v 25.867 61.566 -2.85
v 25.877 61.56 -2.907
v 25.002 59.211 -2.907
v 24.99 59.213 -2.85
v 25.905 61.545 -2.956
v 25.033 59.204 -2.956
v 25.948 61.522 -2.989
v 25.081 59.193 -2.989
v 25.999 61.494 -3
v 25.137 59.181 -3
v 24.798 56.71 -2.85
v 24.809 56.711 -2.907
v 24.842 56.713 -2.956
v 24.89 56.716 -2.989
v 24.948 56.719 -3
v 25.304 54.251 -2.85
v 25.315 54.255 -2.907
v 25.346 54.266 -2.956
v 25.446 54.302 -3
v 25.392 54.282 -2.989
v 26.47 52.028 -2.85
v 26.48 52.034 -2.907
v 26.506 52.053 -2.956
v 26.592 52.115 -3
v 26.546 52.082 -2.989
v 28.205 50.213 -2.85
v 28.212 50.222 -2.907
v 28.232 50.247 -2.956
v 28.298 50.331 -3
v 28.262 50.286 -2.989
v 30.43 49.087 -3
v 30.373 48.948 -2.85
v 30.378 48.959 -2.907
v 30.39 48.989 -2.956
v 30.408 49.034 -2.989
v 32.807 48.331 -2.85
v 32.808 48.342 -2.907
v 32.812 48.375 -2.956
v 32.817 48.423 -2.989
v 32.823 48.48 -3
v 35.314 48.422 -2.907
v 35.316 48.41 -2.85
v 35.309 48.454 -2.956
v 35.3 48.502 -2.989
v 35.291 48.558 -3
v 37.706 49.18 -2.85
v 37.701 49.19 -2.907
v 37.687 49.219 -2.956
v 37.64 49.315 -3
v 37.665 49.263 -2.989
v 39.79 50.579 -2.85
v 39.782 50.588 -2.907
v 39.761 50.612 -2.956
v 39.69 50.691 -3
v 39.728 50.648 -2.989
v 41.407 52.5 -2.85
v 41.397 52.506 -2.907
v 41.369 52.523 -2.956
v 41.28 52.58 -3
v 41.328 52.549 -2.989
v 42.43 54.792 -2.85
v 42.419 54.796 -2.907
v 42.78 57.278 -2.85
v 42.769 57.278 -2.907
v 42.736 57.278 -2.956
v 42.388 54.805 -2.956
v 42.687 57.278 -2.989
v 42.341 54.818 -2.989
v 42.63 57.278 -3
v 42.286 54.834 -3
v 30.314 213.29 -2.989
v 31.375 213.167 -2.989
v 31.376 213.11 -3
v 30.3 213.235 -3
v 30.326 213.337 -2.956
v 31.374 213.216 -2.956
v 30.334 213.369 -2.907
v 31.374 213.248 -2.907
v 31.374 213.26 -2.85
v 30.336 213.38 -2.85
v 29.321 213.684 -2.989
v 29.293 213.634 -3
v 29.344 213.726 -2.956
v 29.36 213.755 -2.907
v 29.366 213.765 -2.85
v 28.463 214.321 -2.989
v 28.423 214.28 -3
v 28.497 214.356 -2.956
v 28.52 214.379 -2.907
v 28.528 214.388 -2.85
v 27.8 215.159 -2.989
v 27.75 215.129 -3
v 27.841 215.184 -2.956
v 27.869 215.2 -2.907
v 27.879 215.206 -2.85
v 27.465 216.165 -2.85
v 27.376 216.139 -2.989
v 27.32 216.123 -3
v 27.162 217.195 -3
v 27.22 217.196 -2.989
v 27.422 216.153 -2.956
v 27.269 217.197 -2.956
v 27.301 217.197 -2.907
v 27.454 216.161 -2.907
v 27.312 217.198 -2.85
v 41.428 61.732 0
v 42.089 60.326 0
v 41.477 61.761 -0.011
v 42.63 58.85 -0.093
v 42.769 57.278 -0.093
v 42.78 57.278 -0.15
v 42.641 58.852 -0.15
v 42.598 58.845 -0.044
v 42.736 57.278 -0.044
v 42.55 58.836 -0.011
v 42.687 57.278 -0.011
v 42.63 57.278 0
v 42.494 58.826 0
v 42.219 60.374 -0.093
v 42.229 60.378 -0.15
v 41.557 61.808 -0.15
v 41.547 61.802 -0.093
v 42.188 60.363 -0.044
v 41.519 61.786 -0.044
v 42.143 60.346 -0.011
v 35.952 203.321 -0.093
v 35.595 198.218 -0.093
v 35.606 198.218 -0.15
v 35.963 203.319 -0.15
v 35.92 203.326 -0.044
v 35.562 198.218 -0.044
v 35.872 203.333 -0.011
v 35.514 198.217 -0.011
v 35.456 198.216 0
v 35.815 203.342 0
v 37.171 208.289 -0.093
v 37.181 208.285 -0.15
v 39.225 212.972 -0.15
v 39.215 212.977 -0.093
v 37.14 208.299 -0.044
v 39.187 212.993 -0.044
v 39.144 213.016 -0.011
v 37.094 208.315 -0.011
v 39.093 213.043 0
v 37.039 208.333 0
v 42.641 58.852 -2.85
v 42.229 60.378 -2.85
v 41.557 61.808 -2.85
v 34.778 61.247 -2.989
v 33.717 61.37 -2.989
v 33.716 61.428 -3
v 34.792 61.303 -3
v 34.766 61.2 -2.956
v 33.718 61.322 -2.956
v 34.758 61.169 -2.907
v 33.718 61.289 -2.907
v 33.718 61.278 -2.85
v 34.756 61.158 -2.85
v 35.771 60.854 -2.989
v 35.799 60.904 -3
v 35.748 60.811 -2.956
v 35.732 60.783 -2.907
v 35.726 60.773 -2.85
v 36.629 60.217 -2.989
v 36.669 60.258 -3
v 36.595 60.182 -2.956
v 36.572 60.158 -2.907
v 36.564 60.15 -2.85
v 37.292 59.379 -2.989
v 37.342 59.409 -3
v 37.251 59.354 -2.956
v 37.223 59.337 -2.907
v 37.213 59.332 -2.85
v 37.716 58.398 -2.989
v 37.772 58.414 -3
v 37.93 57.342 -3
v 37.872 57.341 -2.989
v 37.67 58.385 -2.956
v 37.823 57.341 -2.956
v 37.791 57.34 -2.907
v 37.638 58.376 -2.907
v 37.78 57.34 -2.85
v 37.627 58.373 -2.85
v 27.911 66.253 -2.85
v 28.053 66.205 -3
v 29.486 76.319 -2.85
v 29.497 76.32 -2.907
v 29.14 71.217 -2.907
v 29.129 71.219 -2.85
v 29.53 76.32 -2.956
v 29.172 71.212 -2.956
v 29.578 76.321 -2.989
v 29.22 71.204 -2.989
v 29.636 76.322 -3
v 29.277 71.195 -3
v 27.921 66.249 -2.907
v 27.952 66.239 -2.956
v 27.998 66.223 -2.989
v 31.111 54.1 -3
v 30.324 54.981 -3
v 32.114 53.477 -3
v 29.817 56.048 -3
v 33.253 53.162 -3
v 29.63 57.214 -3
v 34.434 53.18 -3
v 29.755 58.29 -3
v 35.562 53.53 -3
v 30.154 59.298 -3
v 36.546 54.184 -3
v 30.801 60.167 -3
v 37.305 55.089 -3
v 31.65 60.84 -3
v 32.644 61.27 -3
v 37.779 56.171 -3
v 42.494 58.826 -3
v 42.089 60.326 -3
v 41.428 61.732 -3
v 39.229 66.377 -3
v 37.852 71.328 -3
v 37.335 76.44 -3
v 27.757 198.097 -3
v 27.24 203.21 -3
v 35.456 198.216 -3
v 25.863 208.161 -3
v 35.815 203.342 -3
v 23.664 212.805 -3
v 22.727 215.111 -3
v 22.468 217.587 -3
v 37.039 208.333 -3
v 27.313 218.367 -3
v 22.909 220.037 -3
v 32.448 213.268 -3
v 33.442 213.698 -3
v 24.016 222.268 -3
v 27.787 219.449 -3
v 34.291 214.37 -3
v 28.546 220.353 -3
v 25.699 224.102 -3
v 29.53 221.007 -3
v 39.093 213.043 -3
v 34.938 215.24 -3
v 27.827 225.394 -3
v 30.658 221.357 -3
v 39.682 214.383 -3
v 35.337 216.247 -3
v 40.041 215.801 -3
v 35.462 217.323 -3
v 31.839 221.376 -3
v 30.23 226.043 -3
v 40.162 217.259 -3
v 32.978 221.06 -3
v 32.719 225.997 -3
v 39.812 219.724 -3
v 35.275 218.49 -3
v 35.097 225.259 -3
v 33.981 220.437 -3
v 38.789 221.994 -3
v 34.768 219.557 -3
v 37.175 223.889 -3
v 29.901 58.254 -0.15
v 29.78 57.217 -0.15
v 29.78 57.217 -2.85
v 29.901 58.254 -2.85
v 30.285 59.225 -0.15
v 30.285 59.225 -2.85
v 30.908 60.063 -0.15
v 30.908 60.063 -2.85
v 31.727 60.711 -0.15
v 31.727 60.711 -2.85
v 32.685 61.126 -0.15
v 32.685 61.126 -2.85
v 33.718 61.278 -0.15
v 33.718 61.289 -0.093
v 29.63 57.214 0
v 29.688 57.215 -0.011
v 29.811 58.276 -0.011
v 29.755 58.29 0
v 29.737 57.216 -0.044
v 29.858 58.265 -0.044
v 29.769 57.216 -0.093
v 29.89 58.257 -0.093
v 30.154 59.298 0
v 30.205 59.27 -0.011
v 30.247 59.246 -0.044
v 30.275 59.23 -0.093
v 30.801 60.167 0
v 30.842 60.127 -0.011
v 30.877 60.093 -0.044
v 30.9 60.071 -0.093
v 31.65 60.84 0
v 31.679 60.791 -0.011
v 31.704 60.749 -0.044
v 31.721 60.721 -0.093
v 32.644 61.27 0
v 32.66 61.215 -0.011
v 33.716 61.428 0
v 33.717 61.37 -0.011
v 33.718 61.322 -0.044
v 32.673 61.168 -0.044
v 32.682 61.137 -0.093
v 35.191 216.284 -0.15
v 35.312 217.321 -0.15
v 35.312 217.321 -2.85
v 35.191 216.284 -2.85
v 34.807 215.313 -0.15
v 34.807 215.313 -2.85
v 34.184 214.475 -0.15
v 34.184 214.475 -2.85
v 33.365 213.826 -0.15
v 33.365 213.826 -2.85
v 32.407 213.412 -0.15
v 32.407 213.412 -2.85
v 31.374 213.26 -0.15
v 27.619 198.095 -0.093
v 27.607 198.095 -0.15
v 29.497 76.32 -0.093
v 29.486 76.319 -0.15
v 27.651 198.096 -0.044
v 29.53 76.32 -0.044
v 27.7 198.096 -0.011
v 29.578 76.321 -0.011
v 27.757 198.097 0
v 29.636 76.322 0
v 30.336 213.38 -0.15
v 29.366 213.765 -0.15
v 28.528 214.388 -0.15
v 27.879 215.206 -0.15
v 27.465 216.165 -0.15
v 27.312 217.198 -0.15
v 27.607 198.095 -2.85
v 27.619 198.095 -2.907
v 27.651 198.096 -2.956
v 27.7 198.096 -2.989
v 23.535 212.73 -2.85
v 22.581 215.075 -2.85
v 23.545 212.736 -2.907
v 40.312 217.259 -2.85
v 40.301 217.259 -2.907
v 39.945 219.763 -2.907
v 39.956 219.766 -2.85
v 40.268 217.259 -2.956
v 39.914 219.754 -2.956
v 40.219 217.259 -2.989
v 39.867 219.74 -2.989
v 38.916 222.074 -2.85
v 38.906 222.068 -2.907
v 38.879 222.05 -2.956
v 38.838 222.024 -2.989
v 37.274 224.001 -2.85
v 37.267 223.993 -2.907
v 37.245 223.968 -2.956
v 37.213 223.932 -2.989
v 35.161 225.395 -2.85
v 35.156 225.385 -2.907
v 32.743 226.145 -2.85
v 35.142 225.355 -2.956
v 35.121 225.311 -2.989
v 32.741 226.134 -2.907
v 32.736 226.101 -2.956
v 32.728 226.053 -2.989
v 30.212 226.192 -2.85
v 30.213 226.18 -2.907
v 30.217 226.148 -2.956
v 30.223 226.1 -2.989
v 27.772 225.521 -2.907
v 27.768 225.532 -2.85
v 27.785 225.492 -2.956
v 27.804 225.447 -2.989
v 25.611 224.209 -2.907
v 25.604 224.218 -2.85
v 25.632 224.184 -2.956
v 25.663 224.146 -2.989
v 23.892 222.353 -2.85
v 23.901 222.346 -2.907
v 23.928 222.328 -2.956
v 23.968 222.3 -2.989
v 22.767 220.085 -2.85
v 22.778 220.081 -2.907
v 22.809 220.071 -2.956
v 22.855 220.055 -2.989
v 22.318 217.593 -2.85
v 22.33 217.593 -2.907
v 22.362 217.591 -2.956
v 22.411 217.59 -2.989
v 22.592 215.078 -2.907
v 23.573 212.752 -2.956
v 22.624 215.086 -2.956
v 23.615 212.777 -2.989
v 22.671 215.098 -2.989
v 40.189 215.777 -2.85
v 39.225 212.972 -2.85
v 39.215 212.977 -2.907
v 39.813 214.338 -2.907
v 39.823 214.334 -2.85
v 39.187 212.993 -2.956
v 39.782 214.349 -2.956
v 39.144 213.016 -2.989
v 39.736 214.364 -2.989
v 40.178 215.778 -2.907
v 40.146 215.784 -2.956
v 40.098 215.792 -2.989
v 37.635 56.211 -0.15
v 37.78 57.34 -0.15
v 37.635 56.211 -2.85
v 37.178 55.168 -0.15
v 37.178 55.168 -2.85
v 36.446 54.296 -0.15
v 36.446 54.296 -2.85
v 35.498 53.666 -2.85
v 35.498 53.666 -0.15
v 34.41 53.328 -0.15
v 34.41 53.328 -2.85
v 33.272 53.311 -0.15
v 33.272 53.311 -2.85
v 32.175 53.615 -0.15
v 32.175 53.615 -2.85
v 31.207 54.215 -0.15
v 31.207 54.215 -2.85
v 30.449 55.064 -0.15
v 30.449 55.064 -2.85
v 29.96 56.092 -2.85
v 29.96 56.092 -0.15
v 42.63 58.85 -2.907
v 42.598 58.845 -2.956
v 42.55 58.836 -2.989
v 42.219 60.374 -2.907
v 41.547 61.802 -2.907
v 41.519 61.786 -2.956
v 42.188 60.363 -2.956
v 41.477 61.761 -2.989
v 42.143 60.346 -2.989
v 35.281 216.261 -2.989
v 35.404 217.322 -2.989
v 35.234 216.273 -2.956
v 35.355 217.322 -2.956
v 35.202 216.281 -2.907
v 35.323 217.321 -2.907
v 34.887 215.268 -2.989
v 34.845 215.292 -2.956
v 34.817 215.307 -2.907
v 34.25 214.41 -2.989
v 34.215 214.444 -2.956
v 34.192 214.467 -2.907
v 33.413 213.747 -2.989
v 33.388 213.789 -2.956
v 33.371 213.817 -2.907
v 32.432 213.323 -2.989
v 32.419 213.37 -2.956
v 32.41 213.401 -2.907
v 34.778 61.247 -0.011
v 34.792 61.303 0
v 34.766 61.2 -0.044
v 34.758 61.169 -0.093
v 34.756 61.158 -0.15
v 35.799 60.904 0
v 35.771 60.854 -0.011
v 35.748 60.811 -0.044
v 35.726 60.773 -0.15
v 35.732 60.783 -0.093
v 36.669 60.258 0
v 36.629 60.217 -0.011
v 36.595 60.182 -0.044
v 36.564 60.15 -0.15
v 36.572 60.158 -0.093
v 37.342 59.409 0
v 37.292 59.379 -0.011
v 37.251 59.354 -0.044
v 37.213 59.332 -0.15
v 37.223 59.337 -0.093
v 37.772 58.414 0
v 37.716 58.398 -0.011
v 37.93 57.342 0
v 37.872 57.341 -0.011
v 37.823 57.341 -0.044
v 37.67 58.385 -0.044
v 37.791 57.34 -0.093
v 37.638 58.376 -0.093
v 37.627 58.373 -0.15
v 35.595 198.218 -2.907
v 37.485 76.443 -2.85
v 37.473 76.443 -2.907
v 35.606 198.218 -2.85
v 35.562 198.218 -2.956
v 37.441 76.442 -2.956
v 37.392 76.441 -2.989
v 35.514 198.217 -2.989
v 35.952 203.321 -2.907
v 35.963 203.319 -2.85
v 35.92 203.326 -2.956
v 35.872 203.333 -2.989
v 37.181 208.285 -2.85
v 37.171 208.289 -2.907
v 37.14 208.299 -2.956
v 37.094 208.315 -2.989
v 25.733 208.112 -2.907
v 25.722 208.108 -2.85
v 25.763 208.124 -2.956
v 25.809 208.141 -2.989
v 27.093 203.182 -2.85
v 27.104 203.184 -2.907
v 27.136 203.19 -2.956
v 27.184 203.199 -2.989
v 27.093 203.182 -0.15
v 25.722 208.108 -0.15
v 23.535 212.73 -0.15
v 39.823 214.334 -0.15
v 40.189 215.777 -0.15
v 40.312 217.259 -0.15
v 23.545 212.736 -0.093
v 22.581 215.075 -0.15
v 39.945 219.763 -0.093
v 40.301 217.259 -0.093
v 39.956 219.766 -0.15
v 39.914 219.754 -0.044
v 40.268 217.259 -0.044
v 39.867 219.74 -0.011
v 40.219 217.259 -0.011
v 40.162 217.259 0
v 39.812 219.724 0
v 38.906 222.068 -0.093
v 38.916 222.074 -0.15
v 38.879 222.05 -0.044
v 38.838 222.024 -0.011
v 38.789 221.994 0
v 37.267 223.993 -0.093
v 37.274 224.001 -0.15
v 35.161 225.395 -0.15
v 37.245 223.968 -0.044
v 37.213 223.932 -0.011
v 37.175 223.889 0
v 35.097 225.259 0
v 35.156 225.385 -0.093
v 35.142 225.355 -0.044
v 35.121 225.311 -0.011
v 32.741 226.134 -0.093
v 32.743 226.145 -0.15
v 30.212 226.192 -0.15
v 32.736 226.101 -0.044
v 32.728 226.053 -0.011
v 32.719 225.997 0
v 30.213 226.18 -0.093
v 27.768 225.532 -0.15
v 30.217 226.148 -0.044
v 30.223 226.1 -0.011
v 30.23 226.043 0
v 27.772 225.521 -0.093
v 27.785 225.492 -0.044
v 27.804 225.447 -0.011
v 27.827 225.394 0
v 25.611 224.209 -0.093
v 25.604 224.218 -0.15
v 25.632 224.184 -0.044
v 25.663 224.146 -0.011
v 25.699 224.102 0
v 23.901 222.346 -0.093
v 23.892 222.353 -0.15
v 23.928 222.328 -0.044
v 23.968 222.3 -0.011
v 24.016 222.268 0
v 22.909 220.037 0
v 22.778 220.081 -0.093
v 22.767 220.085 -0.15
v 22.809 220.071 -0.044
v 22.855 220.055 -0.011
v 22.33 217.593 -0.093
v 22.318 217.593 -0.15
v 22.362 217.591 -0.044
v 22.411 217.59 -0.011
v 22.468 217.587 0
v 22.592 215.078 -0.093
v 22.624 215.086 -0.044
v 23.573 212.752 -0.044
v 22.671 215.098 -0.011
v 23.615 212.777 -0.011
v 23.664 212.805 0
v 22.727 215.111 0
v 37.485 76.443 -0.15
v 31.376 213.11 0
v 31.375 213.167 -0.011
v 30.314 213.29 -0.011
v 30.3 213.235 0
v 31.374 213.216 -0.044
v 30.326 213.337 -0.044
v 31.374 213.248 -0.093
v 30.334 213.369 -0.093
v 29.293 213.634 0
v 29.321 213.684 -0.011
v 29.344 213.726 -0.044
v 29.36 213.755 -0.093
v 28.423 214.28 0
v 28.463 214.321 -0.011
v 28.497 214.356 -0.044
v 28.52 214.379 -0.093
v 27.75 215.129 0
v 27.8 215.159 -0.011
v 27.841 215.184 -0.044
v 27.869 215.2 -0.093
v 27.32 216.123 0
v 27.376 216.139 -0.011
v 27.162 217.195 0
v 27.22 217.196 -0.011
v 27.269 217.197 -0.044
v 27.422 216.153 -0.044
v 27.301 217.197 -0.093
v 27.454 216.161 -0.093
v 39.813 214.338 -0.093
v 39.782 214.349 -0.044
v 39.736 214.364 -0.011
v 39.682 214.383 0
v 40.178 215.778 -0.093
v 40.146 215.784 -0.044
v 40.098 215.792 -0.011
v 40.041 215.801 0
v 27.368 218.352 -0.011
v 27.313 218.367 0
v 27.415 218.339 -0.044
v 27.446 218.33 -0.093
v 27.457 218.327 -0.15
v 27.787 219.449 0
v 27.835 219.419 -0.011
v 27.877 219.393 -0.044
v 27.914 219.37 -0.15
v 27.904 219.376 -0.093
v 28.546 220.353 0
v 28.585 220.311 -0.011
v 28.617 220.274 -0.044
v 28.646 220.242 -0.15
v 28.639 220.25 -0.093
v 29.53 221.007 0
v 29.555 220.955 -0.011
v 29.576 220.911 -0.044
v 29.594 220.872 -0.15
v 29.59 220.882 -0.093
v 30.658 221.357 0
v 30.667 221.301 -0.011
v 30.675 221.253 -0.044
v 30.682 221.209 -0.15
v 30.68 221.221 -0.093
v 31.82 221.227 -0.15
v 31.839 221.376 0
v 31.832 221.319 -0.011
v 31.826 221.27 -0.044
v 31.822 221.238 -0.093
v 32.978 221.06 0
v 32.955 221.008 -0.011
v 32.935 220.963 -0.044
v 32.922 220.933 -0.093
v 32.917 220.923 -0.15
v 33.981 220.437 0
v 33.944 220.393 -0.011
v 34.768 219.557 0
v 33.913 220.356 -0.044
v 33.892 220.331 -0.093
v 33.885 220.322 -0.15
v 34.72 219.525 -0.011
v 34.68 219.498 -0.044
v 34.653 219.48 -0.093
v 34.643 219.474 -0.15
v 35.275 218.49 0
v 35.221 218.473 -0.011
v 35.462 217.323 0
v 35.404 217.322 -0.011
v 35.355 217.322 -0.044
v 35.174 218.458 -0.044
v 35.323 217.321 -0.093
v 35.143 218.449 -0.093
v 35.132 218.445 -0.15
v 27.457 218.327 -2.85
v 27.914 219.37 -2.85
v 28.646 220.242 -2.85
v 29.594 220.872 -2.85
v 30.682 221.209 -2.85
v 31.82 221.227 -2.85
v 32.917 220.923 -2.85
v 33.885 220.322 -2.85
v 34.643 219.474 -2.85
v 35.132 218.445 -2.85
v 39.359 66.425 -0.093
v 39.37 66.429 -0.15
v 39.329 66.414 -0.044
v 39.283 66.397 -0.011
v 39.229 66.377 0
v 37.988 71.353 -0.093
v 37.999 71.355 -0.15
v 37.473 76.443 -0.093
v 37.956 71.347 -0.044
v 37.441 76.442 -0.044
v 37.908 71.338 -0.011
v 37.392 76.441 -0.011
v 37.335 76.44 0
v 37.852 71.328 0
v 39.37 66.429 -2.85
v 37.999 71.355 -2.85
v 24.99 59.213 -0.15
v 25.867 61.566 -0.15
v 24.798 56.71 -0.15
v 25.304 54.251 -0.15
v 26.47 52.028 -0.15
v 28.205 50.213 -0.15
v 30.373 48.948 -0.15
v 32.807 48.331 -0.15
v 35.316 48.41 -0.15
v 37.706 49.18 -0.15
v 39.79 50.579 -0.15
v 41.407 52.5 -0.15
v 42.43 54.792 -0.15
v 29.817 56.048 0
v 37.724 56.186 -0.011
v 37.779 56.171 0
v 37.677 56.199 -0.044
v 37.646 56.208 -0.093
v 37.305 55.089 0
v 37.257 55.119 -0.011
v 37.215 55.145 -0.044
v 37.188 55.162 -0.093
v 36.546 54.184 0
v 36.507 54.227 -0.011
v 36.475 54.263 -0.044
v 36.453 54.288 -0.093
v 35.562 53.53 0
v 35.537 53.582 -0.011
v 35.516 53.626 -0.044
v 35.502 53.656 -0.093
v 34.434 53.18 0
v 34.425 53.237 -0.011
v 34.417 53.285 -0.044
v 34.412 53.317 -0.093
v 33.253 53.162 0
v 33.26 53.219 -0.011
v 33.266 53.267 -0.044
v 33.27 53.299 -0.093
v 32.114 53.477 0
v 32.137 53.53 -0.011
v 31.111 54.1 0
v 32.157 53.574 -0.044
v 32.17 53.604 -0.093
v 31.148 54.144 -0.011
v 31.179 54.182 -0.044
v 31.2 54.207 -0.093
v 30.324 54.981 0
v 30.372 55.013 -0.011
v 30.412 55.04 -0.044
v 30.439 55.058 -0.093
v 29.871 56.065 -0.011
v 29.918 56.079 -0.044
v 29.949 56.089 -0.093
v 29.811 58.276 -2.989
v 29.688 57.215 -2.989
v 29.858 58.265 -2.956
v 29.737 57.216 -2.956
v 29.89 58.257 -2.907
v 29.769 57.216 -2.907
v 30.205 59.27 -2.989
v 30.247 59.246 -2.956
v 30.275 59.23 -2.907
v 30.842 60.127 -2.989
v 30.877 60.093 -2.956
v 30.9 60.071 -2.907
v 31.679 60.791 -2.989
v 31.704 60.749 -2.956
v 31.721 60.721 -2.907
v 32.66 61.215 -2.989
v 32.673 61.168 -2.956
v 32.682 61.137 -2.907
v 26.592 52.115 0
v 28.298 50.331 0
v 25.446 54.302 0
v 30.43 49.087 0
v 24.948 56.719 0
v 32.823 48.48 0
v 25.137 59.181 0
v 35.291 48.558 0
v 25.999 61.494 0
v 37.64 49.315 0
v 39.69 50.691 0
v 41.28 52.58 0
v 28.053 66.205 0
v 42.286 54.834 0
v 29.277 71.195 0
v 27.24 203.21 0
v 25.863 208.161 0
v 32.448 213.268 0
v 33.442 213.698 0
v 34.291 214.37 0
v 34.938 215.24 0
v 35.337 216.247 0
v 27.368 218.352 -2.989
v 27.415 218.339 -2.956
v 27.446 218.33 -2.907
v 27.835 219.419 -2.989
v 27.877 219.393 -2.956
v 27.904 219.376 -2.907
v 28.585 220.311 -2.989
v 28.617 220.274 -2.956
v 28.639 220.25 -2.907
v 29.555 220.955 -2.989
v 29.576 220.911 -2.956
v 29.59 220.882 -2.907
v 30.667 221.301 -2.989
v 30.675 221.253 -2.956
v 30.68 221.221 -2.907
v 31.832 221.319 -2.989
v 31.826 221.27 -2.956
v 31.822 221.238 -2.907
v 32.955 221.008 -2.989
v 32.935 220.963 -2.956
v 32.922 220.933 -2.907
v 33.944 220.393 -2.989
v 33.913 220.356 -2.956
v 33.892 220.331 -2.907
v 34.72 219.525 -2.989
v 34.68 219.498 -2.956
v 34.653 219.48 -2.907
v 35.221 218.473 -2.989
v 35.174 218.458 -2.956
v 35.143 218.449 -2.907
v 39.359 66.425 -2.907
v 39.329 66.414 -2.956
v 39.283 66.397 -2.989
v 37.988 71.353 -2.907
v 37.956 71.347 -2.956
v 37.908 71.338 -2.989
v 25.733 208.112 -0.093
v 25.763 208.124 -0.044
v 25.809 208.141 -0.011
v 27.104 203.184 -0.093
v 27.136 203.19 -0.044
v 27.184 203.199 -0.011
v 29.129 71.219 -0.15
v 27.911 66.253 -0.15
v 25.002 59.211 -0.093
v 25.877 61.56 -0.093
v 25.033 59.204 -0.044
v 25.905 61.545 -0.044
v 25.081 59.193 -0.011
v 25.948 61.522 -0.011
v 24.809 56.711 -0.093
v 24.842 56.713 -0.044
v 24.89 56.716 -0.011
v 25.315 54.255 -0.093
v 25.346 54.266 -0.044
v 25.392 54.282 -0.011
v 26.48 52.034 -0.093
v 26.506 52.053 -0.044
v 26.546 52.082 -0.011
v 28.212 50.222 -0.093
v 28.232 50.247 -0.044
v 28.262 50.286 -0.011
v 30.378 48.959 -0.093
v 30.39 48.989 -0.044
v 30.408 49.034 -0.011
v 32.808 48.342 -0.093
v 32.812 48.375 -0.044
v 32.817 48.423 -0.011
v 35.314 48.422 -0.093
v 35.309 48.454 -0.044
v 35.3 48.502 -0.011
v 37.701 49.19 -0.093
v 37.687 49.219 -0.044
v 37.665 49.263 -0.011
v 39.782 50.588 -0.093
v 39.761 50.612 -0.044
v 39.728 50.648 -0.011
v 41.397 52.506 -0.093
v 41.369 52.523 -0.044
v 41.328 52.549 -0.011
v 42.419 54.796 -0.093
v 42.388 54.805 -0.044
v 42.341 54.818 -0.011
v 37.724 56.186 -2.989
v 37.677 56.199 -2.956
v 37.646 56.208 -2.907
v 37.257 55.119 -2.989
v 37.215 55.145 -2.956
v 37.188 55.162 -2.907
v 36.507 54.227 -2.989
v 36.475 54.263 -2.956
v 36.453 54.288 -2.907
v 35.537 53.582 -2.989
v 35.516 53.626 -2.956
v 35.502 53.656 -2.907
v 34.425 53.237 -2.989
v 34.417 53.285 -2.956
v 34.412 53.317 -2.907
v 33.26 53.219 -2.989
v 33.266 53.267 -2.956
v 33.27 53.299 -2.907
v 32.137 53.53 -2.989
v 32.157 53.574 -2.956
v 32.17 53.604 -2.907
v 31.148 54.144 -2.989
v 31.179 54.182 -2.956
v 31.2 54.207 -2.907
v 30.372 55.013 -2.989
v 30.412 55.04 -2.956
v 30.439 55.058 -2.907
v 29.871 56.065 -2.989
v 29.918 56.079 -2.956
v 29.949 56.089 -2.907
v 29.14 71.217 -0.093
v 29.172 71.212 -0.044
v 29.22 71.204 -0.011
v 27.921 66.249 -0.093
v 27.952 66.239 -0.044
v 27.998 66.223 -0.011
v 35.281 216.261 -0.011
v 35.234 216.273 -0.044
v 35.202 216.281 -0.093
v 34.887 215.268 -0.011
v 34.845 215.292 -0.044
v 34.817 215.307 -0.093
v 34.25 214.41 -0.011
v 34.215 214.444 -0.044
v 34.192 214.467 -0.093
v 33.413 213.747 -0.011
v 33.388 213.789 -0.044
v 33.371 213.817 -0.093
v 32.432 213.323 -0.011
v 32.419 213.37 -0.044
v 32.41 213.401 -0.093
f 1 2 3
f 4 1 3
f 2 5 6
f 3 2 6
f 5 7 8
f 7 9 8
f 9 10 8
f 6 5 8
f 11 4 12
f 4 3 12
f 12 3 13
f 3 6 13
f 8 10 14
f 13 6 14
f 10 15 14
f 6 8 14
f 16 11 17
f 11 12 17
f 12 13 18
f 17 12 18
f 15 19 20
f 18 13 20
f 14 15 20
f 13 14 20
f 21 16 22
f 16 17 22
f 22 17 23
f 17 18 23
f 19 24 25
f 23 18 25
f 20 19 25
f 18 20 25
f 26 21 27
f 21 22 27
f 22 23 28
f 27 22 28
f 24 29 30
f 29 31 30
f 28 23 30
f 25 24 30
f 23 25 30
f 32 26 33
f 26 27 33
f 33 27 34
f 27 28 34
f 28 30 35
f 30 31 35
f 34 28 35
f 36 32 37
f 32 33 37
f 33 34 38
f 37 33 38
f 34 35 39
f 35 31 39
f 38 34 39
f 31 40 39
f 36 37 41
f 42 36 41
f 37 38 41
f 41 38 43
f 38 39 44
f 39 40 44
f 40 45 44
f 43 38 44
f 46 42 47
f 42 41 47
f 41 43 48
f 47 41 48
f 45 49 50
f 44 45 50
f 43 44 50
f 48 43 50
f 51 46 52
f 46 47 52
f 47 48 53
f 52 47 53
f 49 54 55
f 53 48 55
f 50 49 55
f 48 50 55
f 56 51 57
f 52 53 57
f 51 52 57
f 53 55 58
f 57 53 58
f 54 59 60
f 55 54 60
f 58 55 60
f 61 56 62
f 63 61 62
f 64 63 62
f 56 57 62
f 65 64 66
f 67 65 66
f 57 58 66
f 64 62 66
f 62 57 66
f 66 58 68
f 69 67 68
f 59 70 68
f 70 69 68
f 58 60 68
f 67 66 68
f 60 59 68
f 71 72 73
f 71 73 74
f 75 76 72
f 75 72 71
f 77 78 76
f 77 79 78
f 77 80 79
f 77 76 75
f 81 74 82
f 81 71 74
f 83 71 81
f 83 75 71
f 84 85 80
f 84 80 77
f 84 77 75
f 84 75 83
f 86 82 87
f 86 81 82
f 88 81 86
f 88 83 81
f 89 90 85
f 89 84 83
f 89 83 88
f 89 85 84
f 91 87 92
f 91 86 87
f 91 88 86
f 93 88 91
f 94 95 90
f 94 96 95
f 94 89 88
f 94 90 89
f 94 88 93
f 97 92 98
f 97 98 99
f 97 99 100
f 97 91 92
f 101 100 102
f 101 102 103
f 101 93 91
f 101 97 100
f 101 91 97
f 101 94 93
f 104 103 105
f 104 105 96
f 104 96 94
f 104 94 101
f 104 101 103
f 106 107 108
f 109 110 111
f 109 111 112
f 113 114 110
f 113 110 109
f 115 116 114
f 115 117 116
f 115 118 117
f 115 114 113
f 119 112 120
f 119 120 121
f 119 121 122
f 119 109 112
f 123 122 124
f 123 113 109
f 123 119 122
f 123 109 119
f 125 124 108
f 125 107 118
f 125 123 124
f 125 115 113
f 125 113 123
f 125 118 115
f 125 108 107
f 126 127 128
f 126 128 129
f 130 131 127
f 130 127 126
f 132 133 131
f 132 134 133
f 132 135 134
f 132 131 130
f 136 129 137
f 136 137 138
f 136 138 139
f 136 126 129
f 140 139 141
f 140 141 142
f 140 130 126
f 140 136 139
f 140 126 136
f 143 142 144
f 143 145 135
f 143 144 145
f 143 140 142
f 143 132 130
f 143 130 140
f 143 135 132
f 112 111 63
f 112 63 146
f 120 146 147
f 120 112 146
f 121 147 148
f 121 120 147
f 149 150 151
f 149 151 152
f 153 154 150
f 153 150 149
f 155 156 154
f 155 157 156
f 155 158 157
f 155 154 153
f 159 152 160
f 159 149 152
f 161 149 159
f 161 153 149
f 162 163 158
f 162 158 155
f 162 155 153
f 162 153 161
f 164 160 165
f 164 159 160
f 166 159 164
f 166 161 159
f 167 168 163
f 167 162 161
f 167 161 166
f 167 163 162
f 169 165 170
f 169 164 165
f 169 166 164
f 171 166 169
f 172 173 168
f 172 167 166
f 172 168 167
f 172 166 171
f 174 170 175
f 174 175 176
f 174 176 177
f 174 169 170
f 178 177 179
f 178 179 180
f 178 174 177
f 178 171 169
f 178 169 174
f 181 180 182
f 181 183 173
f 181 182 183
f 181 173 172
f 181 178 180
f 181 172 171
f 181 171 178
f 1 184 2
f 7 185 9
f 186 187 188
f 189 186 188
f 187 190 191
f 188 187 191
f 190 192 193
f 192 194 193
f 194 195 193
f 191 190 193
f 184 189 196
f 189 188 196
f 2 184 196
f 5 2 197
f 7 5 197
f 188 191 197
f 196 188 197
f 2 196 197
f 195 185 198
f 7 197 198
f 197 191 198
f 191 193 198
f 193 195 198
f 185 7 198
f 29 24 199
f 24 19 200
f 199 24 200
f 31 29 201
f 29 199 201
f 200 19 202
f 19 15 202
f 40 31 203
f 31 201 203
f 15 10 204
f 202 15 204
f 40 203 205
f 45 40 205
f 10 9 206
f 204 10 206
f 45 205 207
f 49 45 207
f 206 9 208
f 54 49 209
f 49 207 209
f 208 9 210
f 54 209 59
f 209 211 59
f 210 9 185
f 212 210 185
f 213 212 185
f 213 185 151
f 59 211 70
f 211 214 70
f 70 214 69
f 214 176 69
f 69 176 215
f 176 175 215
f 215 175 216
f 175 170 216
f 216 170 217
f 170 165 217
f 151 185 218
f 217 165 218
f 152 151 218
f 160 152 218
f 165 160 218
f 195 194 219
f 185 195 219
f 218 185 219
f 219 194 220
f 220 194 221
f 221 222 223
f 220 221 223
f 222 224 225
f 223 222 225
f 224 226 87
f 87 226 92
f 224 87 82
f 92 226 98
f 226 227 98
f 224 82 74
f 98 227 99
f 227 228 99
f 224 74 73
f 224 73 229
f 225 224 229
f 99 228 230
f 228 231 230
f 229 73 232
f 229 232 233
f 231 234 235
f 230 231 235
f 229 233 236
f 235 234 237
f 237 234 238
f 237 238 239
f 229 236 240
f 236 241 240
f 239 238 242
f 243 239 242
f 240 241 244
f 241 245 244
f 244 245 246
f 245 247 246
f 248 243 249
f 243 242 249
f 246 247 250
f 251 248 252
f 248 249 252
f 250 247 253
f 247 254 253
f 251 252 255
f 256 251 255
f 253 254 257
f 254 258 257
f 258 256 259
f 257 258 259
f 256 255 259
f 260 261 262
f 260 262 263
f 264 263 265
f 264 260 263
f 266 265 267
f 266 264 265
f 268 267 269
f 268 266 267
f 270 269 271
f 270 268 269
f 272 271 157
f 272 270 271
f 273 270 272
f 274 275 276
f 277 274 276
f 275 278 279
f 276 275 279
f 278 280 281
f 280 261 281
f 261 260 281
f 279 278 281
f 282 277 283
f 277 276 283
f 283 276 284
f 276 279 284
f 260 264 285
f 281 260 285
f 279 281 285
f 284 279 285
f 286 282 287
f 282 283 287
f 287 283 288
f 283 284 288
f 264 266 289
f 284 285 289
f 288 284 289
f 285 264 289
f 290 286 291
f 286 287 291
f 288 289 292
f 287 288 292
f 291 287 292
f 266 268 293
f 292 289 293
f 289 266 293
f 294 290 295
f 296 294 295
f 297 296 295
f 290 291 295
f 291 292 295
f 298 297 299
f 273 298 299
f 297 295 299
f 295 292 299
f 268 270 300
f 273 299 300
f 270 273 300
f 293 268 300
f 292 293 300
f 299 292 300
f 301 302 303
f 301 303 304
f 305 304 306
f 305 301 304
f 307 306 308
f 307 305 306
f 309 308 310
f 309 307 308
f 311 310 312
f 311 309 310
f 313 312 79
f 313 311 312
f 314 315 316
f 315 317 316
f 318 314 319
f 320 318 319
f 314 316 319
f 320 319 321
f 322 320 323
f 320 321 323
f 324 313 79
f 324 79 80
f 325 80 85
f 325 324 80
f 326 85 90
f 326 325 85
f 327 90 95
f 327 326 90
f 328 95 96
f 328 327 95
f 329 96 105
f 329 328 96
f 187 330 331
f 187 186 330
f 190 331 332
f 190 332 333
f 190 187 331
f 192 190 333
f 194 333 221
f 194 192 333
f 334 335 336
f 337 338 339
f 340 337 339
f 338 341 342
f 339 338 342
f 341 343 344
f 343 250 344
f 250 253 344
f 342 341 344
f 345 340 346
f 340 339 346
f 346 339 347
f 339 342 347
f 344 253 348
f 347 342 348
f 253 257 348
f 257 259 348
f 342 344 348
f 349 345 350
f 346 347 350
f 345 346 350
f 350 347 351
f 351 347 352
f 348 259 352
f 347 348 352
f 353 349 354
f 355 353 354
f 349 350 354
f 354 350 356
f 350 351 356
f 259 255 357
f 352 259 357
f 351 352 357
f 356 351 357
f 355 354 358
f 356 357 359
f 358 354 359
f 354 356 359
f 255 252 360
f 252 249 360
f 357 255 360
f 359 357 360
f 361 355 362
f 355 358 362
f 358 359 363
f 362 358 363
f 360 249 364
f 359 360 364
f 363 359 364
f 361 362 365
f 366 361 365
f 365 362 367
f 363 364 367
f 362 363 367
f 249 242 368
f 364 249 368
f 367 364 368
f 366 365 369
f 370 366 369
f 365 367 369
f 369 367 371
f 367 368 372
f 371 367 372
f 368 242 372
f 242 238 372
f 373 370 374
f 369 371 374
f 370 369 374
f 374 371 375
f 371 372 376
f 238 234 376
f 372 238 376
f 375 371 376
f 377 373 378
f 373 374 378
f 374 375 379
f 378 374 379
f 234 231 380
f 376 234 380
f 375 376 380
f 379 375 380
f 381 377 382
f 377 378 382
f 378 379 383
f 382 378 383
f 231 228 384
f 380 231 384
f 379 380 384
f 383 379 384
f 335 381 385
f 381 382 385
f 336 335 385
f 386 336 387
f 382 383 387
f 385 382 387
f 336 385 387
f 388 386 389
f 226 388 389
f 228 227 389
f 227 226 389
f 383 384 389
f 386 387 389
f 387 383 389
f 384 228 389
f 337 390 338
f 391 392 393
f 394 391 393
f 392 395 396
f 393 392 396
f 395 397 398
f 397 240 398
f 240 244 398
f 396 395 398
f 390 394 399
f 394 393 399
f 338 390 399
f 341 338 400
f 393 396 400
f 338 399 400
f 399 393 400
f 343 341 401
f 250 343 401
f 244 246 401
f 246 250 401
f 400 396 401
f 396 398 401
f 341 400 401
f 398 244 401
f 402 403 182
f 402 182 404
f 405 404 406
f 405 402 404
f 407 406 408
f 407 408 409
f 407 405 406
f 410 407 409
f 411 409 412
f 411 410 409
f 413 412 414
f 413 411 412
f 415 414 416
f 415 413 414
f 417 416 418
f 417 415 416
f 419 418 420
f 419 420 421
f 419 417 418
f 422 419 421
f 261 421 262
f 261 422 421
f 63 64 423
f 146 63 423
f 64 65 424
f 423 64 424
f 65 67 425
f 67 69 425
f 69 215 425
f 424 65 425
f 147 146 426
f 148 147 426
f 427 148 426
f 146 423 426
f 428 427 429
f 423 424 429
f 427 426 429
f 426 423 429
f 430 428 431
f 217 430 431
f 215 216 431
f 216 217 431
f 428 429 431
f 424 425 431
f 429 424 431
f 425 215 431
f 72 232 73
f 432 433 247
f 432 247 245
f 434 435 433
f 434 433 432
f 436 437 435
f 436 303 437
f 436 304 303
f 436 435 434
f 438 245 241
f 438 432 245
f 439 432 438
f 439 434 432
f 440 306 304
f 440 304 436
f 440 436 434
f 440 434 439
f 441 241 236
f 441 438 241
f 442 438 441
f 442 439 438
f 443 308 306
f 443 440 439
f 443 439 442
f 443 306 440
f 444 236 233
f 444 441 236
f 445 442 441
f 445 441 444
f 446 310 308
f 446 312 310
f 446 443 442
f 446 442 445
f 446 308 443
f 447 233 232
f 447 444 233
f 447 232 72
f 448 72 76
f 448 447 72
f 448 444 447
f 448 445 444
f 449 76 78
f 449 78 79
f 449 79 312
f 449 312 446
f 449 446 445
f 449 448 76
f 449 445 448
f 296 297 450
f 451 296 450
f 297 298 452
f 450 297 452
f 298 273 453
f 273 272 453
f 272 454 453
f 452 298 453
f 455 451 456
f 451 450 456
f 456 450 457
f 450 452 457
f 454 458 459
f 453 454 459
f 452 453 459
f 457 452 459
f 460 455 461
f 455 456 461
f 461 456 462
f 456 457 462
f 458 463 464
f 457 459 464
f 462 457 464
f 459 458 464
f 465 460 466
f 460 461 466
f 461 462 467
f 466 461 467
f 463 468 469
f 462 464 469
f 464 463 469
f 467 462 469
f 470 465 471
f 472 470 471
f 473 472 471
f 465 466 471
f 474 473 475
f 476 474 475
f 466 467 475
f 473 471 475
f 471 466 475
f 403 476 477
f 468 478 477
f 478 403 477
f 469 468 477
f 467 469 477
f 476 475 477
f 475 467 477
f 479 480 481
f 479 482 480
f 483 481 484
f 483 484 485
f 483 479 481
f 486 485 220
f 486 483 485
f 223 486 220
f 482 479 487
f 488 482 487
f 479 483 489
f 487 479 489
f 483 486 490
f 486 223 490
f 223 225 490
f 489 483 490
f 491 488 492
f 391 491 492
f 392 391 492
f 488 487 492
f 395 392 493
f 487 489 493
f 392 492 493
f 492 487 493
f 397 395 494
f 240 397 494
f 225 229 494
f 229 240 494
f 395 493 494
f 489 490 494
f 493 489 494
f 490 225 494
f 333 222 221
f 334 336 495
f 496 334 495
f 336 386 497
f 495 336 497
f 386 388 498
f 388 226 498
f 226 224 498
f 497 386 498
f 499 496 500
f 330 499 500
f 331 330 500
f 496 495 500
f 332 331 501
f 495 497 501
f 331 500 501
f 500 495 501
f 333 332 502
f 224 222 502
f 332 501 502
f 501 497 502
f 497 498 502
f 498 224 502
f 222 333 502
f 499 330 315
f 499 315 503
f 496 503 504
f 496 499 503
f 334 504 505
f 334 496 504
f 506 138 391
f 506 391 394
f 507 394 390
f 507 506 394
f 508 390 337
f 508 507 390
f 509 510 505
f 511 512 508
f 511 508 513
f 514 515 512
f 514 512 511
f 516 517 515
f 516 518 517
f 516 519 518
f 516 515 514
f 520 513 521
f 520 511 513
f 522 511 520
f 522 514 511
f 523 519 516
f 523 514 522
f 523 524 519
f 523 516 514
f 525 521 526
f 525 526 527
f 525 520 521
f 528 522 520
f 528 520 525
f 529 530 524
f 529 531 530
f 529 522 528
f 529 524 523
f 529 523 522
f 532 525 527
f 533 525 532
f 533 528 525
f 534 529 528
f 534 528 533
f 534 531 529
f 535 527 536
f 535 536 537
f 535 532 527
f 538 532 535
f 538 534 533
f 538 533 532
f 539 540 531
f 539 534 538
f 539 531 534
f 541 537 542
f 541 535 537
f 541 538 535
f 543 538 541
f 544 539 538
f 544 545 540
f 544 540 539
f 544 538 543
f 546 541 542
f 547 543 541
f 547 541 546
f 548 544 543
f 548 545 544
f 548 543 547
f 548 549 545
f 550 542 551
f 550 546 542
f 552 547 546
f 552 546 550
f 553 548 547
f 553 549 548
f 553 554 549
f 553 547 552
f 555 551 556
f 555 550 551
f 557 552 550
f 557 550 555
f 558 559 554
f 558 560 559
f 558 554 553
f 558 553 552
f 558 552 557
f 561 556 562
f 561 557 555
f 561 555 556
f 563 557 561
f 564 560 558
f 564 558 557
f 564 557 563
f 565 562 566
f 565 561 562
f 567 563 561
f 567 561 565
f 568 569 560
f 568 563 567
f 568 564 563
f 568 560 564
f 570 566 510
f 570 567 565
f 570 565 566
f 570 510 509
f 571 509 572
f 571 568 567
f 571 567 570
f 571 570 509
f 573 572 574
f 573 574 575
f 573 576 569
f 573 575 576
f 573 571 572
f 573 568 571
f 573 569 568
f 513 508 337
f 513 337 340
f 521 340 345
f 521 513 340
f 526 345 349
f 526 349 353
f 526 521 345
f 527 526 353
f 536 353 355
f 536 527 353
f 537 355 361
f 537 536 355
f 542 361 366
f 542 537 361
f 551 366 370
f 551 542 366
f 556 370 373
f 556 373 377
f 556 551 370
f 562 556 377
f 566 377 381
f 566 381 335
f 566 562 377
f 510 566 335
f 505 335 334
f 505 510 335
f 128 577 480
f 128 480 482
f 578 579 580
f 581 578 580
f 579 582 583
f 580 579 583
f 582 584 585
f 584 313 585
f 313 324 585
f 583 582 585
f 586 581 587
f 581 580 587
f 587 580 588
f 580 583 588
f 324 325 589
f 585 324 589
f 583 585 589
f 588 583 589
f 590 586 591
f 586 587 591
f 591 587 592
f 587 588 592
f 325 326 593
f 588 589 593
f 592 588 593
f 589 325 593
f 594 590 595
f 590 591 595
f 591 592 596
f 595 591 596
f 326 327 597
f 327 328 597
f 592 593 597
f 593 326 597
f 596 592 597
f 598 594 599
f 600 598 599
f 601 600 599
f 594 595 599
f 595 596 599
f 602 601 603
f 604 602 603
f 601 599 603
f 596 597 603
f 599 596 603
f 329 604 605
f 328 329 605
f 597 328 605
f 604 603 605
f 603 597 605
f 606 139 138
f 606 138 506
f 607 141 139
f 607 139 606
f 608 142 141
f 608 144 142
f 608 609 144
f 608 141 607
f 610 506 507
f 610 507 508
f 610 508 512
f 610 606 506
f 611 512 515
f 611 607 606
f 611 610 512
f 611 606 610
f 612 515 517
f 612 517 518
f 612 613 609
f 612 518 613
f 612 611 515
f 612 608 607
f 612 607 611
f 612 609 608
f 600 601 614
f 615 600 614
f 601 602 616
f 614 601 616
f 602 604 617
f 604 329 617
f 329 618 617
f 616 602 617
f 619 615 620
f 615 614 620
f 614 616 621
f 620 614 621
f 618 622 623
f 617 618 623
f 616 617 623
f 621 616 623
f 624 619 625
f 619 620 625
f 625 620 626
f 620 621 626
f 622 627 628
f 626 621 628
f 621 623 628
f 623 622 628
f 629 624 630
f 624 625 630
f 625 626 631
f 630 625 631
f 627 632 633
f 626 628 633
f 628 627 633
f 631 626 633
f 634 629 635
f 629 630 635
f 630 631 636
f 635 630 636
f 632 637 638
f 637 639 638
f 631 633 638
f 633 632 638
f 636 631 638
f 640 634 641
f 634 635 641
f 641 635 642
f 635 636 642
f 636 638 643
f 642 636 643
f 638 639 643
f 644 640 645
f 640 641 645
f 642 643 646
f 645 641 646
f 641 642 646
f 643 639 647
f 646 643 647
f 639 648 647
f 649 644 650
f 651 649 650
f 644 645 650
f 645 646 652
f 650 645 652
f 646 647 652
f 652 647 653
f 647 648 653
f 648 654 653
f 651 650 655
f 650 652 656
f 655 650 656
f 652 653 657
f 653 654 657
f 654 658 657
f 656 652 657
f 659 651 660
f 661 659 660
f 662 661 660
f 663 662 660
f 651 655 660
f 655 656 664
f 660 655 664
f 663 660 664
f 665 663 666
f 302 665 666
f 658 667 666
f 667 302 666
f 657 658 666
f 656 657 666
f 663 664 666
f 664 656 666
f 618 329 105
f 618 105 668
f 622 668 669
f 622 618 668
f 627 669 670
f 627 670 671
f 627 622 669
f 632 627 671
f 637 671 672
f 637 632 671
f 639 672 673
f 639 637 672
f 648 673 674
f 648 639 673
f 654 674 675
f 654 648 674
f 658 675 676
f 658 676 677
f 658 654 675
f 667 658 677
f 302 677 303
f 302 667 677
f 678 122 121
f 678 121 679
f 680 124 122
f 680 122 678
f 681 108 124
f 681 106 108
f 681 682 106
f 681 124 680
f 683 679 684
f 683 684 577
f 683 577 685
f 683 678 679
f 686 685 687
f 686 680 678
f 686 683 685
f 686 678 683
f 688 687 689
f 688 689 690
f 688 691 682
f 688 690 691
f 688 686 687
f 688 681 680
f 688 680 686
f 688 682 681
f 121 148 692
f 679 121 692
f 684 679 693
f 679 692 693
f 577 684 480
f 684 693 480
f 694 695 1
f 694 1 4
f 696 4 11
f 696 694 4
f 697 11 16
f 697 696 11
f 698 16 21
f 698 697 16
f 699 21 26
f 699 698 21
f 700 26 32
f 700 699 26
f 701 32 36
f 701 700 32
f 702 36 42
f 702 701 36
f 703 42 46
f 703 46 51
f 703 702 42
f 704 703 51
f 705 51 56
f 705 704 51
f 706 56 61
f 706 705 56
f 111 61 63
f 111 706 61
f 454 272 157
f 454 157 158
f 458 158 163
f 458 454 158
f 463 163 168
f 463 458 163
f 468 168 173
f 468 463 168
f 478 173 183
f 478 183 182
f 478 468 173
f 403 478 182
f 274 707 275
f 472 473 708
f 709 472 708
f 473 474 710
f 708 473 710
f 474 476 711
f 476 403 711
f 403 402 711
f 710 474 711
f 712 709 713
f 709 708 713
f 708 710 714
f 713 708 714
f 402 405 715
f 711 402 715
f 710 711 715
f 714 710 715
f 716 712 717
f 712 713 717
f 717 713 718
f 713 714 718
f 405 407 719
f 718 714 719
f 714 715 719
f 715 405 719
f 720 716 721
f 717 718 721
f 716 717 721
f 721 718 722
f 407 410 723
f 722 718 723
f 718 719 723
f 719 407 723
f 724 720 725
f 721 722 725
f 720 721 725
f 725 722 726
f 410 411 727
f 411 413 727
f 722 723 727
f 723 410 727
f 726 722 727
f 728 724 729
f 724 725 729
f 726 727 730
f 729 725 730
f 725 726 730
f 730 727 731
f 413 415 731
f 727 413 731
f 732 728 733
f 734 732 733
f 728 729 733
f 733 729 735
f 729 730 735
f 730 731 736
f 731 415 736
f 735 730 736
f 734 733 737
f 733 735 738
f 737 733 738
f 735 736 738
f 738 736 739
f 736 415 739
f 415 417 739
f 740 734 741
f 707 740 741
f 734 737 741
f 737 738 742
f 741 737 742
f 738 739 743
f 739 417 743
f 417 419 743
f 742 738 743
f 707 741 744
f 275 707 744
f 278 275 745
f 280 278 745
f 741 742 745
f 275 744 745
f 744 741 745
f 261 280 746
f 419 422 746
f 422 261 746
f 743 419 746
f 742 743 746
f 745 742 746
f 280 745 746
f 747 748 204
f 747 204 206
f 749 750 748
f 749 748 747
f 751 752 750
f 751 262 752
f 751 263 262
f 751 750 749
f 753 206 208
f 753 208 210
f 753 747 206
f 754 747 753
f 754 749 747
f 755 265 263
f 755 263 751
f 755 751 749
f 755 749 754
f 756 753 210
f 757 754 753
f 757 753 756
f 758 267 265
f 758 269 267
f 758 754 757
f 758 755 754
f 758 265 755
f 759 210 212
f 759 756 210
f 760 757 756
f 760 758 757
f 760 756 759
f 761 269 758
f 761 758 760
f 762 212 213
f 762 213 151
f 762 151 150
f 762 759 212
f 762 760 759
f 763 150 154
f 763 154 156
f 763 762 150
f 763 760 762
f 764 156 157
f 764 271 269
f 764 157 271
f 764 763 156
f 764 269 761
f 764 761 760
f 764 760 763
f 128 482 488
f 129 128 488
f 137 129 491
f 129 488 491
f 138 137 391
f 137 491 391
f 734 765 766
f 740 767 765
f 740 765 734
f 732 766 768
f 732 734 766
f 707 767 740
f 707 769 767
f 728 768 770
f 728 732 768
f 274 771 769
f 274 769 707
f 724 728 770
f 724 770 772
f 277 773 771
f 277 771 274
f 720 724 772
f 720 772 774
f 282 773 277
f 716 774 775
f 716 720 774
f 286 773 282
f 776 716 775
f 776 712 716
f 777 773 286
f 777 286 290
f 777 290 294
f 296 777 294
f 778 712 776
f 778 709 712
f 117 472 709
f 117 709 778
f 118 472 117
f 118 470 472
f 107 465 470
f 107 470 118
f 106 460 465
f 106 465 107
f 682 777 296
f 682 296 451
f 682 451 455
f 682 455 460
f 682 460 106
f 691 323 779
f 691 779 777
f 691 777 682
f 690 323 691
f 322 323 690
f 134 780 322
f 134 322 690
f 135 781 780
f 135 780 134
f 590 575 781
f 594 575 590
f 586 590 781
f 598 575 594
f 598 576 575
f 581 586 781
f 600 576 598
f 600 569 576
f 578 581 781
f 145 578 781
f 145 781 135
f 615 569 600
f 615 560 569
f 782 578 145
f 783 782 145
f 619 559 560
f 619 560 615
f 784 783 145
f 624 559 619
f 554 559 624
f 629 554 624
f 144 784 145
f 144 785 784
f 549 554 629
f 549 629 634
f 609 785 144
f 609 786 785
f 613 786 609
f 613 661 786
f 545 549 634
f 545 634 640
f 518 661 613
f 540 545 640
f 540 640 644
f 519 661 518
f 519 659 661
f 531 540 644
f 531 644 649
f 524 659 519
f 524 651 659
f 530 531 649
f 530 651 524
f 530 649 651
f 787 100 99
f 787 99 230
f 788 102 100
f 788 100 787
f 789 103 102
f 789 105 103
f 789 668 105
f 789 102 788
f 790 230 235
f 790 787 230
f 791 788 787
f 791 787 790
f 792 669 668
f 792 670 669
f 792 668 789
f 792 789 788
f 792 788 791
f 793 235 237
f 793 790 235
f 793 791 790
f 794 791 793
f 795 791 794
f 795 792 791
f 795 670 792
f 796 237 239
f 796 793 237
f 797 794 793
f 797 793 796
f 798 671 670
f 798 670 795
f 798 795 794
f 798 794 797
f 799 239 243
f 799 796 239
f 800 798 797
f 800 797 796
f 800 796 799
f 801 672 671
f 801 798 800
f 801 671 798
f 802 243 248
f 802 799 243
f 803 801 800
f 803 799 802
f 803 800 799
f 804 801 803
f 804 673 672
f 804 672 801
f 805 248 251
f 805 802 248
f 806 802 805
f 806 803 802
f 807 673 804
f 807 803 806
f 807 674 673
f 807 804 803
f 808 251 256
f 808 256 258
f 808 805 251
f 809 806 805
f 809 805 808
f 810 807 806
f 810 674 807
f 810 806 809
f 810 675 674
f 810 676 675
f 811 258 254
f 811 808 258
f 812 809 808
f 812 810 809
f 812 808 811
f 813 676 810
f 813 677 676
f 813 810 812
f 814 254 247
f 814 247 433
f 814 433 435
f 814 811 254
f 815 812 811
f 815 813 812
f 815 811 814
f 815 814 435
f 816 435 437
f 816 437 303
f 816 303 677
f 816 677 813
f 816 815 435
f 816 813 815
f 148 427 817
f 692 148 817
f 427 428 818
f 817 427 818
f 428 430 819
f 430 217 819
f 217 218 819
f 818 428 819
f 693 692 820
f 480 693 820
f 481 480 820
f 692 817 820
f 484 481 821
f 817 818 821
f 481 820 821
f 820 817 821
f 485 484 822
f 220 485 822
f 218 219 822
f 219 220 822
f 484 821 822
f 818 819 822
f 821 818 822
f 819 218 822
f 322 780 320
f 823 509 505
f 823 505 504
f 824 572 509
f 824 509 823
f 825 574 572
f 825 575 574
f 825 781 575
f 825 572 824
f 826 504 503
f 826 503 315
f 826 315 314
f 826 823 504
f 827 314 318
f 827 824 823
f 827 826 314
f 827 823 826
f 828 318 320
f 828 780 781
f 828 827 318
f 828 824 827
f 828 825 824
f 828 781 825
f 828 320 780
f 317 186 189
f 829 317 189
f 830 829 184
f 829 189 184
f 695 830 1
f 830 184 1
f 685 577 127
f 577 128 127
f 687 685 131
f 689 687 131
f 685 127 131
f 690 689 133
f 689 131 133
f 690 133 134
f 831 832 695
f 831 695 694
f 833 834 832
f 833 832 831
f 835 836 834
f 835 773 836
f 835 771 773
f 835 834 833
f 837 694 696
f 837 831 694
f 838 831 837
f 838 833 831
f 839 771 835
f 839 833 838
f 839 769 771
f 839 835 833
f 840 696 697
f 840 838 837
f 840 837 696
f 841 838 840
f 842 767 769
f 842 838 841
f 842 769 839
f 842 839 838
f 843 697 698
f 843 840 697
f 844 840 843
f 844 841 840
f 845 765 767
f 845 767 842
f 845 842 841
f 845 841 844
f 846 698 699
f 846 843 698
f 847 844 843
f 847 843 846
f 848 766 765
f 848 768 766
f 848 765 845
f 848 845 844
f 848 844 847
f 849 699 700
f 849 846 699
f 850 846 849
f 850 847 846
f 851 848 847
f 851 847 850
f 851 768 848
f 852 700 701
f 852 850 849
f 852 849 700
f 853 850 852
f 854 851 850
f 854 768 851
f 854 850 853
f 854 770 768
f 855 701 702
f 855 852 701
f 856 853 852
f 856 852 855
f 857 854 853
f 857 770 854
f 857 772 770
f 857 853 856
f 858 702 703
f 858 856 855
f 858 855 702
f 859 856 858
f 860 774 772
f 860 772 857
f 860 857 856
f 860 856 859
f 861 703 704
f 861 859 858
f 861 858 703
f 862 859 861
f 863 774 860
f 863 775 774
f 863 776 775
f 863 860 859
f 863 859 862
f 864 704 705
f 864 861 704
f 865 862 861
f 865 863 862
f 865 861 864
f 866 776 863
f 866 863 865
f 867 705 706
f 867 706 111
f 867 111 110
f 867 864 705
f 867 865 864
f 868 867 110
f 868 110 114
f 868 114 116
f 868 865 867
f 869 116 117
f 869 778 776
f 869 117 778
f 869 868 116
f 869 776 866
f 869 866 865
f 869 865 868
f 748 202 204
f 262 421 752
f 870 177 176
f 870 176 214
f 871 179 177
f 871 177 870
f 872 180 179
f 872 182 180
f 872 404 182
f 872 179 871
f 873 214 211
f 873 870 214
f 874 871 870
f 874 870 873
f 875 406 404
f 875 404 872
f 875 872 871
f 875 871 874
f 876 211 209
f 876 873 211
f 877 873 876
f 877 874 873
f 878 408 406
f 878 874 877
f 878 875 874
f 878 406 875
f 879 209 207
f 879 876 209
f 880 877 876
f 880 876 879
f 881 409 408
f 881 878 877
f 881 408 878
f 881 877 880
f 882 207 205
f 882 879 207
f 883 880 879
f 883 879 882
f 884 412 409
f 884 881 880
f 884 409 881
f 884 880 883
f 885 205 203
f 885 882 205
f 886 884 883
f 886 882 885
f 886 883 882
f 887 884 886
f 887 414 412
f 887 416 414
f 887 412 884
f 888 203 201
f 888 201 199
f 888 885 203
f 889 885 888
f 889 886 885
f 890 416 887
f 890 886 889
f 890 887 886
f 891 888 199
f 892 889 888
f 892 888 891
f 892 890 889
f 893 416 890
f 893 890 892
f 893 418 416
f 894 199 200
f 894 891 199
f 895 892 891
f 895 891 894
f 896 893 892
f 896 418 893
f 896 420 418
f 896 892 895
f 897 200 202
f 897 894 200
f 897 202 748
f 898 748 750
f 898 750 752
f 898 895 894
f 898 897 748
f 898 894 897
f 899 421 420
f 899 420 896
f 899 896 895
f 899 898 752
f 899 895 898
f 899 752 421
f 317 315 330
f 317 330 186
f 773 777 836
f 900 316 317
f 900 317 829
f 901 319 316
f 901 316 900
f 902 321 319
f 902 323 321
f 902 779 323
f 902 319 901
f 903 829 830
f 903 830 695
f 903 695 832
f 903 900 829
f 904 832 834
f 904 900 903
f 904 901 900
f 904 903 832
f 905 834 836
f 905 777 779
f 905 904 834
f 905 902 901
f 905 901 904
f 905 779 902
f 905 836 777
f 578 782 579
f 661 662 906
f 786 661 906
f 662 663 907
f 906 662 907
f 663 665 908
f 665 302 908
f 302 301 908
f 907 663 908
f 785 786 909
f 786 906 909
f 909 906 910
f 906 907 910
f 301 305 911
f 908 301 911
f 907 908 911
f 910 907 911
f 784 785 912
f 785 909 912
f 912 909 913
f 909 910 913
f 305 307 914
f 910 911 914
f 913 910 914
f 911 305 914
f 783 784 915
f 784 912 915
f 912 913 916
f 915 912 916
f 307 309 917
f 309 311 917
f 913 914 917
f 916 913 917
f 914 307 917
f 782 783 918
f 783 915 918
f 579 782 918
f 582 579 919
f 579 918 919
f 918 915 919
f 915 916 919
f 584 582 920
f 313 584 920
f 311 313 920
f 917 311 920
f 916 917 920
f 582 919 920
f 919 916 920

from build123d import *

# Parameters (mm, degrees)
BOSS_EXTRUDE1_DEPTH = 3
FILLET1_R           = 30
FILLET2_R           = 0.15


with BuildPart() as part:
    # Sketch2 → Boss-Extrude1 (new body)
    with BuildSketch(Plane.XY):
        with BuildLine():
            ThreePointArc((40.312003169, 217.259303311), (26.509736802, 224.871020446), (27.436839225, 209.136304824))
            Line((27.436839225, 209.136304824), (27.312479057, 217.197603389))
            ThreePointArc((27.312479057, 217.197603389), (31.250303247, 221.258827422), (35.31152728, 217.321003232))
            Line((35.31152728, 217.321003232), (35.435887448, 209.259704667))
            ThreePointArc((35.435887448, 209.259704667), (38.996889587, 212.575018868), (40.312003169, 217.259303311))
        make_face()
        with BuildLine():
            Line((31.37370309, 213.259779199), (31.450827992, 208.260374059))
            ThreePointArc((31.450827992, 208.260374059), (33.501144014, 208.529603295), (35.435887448, 209.259704667))
            Line((35.435887448, 209.259704667), (35.31152728, 217.321003232))
            ThreePointArc((35.31152728, 217.321003232), (34.183722222, 214.474841123), (31.37370309, 213.259779199))
        make_face()
        with BuildLine():
            ThreePointArc((27.436839225, 209.136304824), (29.393182911, 208.466230536), (31.450827992, 208.260374059))
            Line((31.450827992, 208.260374059), (31.37370309, 213.259779199))
            ThreePointArc((31.37370309, 213.259779199), (28.527540981, 214.387584257), (27.312479057, 217.197603389))
            Line((27.312479057, 217.197603389), (27.436839225, 209.136304824))
        make_face()
        with BuildLine():
            ThreePointArc((29.65611575, 65.277937502), (31.590859184, 66.008038874), (33.641175206, 66.27726811))
            Line((33.641175206, 66.27726811), (31.450827992, 208.260374059))
            ThreePointArc((31.450827992, 208.260374059), (29.393182911, 208.466230536), (27.436839225, 209.136304824))
            Line((27.436839225, 209.136304824), (29.65611575, 65.277937502))
        make_face()
        with BuildLine():
            Line((31.450827992, 208.260374059), (33.641175206, 66.27726811))
            ThreePointArc((33.641175206, 66.27726811), (35.698820288, 66.071411633), (37.655163974, 65.401337345))
            Line((37.655163974, 65.401337345), (35.435887448, 209.259704667))
            ThreePointArc((35.435887448, 209.259704667), (33.501144014, 208.529603295), (31.450827992, 208.260374059))
        make_face()
        with BuildLine():
            ThreePointArc((37.779524141, 57.34003878), (33.841699951, 53.278814747), (29.780475918, 57.216638937))
            Line((29.780475918, 57.216638937), (29.65611575, 65.277937502))
            ThreePointArc((29.65611575, 65.277937502), (29.095715587, 49.593452441), (42.78000003, 57.278338859))
            ThreePointArc((42.78000003, 57.278338859), (41.391717165, 62.080605225), (37.655163974, 65.401337345))
            Line((37.655163974, 65.401337345), (37.779524141, 57.34003878))
        make_face()
        with BuildLine():
            Line((33.641175206, 66.27726811), (33.718300108, 61.27786297))
            ThreePointArc((33.718300108, 61.27786297), (36.564462218, 60.150057912), (37.779524141, 57.34003878))
            Line((37.779524141, 57.34003878), (37.655163974, 65.401337345))
            ThreePointArc((37.655163974, 65.401337345), (35.698820288, 66.071411633), (33.641175206, 66.27726811))
        make_face()
        with BuildLine():
            ThreePointArc((29.780475918, 57.216638937), (30.908280976, 60.062801047), (33.718300108, 61.27786297))
            Line((33.718300108, 61.27786297), (33.641175206, 66.27726811))
            ThreePointArc((33.641175206, 66.27726811), (31.590859184, 66.008038874), (29.65611575, 65.277937502))
            Line((29.65611575, 65.277937502), (29.780475918, 57.216638937))
        make_face()
    extrude(amount=-BOSS_EXTRUDE1_DEPTH)

    # Fillet1
    fillet1_edges = [part.edges().sort_by_distance(p)[0] for p in [
        (29.65611575, 65.277937502, -1.5),
        (27.436839225, 209.136304824, -1.5),
        (35.435887448, 209.259704667, -1.5),
        (37.655163974, 65.401337345, -1.5),
    ]]
    fillet(fillet1_edges, radius=FILLET1_R)

    # Fillet2
    fillet2_edges = [part.edges().sort_by_distance(p)[0] for p in [
        (27.312479057, 217.197603389, -3),
        (28.546477487, 137.207121163, 0),
        (28.546477487, 137.207121163, -3),
        (31.568557037, 48.554261836, 0),
        (31.568557037, 48.554261836, -3),
        (36.545525711, 137.330521006, 0),
        (37.779524141, 57.34003878, -3),
        (36.545525711, 137.330521006, -3),
        (31.173178345, 226.258232562, 0),
        (31.173178345, 226.258232562, -3),
        (28.62559717, 68.70962022, 0),
        (28.62559717, 68.70962022, -3),
        (38.579337489, 68.863174738, 0),
        (38.579337489, 68.863174738, -3),
        (36.466406028, 205.828021949, 0),
        (36.466406028, 205.828021949, -3),
        (26.512665709, 205.674467431, 0),
        (26.512665709, 205.674467431, -3),
        (37.779524141, 57.34003878, 0),
        (27.312479057, 217.197603389, 0),
    ]]
    fillet(fillet2_edges, radius=FILLET2_R)


solid = part.part
